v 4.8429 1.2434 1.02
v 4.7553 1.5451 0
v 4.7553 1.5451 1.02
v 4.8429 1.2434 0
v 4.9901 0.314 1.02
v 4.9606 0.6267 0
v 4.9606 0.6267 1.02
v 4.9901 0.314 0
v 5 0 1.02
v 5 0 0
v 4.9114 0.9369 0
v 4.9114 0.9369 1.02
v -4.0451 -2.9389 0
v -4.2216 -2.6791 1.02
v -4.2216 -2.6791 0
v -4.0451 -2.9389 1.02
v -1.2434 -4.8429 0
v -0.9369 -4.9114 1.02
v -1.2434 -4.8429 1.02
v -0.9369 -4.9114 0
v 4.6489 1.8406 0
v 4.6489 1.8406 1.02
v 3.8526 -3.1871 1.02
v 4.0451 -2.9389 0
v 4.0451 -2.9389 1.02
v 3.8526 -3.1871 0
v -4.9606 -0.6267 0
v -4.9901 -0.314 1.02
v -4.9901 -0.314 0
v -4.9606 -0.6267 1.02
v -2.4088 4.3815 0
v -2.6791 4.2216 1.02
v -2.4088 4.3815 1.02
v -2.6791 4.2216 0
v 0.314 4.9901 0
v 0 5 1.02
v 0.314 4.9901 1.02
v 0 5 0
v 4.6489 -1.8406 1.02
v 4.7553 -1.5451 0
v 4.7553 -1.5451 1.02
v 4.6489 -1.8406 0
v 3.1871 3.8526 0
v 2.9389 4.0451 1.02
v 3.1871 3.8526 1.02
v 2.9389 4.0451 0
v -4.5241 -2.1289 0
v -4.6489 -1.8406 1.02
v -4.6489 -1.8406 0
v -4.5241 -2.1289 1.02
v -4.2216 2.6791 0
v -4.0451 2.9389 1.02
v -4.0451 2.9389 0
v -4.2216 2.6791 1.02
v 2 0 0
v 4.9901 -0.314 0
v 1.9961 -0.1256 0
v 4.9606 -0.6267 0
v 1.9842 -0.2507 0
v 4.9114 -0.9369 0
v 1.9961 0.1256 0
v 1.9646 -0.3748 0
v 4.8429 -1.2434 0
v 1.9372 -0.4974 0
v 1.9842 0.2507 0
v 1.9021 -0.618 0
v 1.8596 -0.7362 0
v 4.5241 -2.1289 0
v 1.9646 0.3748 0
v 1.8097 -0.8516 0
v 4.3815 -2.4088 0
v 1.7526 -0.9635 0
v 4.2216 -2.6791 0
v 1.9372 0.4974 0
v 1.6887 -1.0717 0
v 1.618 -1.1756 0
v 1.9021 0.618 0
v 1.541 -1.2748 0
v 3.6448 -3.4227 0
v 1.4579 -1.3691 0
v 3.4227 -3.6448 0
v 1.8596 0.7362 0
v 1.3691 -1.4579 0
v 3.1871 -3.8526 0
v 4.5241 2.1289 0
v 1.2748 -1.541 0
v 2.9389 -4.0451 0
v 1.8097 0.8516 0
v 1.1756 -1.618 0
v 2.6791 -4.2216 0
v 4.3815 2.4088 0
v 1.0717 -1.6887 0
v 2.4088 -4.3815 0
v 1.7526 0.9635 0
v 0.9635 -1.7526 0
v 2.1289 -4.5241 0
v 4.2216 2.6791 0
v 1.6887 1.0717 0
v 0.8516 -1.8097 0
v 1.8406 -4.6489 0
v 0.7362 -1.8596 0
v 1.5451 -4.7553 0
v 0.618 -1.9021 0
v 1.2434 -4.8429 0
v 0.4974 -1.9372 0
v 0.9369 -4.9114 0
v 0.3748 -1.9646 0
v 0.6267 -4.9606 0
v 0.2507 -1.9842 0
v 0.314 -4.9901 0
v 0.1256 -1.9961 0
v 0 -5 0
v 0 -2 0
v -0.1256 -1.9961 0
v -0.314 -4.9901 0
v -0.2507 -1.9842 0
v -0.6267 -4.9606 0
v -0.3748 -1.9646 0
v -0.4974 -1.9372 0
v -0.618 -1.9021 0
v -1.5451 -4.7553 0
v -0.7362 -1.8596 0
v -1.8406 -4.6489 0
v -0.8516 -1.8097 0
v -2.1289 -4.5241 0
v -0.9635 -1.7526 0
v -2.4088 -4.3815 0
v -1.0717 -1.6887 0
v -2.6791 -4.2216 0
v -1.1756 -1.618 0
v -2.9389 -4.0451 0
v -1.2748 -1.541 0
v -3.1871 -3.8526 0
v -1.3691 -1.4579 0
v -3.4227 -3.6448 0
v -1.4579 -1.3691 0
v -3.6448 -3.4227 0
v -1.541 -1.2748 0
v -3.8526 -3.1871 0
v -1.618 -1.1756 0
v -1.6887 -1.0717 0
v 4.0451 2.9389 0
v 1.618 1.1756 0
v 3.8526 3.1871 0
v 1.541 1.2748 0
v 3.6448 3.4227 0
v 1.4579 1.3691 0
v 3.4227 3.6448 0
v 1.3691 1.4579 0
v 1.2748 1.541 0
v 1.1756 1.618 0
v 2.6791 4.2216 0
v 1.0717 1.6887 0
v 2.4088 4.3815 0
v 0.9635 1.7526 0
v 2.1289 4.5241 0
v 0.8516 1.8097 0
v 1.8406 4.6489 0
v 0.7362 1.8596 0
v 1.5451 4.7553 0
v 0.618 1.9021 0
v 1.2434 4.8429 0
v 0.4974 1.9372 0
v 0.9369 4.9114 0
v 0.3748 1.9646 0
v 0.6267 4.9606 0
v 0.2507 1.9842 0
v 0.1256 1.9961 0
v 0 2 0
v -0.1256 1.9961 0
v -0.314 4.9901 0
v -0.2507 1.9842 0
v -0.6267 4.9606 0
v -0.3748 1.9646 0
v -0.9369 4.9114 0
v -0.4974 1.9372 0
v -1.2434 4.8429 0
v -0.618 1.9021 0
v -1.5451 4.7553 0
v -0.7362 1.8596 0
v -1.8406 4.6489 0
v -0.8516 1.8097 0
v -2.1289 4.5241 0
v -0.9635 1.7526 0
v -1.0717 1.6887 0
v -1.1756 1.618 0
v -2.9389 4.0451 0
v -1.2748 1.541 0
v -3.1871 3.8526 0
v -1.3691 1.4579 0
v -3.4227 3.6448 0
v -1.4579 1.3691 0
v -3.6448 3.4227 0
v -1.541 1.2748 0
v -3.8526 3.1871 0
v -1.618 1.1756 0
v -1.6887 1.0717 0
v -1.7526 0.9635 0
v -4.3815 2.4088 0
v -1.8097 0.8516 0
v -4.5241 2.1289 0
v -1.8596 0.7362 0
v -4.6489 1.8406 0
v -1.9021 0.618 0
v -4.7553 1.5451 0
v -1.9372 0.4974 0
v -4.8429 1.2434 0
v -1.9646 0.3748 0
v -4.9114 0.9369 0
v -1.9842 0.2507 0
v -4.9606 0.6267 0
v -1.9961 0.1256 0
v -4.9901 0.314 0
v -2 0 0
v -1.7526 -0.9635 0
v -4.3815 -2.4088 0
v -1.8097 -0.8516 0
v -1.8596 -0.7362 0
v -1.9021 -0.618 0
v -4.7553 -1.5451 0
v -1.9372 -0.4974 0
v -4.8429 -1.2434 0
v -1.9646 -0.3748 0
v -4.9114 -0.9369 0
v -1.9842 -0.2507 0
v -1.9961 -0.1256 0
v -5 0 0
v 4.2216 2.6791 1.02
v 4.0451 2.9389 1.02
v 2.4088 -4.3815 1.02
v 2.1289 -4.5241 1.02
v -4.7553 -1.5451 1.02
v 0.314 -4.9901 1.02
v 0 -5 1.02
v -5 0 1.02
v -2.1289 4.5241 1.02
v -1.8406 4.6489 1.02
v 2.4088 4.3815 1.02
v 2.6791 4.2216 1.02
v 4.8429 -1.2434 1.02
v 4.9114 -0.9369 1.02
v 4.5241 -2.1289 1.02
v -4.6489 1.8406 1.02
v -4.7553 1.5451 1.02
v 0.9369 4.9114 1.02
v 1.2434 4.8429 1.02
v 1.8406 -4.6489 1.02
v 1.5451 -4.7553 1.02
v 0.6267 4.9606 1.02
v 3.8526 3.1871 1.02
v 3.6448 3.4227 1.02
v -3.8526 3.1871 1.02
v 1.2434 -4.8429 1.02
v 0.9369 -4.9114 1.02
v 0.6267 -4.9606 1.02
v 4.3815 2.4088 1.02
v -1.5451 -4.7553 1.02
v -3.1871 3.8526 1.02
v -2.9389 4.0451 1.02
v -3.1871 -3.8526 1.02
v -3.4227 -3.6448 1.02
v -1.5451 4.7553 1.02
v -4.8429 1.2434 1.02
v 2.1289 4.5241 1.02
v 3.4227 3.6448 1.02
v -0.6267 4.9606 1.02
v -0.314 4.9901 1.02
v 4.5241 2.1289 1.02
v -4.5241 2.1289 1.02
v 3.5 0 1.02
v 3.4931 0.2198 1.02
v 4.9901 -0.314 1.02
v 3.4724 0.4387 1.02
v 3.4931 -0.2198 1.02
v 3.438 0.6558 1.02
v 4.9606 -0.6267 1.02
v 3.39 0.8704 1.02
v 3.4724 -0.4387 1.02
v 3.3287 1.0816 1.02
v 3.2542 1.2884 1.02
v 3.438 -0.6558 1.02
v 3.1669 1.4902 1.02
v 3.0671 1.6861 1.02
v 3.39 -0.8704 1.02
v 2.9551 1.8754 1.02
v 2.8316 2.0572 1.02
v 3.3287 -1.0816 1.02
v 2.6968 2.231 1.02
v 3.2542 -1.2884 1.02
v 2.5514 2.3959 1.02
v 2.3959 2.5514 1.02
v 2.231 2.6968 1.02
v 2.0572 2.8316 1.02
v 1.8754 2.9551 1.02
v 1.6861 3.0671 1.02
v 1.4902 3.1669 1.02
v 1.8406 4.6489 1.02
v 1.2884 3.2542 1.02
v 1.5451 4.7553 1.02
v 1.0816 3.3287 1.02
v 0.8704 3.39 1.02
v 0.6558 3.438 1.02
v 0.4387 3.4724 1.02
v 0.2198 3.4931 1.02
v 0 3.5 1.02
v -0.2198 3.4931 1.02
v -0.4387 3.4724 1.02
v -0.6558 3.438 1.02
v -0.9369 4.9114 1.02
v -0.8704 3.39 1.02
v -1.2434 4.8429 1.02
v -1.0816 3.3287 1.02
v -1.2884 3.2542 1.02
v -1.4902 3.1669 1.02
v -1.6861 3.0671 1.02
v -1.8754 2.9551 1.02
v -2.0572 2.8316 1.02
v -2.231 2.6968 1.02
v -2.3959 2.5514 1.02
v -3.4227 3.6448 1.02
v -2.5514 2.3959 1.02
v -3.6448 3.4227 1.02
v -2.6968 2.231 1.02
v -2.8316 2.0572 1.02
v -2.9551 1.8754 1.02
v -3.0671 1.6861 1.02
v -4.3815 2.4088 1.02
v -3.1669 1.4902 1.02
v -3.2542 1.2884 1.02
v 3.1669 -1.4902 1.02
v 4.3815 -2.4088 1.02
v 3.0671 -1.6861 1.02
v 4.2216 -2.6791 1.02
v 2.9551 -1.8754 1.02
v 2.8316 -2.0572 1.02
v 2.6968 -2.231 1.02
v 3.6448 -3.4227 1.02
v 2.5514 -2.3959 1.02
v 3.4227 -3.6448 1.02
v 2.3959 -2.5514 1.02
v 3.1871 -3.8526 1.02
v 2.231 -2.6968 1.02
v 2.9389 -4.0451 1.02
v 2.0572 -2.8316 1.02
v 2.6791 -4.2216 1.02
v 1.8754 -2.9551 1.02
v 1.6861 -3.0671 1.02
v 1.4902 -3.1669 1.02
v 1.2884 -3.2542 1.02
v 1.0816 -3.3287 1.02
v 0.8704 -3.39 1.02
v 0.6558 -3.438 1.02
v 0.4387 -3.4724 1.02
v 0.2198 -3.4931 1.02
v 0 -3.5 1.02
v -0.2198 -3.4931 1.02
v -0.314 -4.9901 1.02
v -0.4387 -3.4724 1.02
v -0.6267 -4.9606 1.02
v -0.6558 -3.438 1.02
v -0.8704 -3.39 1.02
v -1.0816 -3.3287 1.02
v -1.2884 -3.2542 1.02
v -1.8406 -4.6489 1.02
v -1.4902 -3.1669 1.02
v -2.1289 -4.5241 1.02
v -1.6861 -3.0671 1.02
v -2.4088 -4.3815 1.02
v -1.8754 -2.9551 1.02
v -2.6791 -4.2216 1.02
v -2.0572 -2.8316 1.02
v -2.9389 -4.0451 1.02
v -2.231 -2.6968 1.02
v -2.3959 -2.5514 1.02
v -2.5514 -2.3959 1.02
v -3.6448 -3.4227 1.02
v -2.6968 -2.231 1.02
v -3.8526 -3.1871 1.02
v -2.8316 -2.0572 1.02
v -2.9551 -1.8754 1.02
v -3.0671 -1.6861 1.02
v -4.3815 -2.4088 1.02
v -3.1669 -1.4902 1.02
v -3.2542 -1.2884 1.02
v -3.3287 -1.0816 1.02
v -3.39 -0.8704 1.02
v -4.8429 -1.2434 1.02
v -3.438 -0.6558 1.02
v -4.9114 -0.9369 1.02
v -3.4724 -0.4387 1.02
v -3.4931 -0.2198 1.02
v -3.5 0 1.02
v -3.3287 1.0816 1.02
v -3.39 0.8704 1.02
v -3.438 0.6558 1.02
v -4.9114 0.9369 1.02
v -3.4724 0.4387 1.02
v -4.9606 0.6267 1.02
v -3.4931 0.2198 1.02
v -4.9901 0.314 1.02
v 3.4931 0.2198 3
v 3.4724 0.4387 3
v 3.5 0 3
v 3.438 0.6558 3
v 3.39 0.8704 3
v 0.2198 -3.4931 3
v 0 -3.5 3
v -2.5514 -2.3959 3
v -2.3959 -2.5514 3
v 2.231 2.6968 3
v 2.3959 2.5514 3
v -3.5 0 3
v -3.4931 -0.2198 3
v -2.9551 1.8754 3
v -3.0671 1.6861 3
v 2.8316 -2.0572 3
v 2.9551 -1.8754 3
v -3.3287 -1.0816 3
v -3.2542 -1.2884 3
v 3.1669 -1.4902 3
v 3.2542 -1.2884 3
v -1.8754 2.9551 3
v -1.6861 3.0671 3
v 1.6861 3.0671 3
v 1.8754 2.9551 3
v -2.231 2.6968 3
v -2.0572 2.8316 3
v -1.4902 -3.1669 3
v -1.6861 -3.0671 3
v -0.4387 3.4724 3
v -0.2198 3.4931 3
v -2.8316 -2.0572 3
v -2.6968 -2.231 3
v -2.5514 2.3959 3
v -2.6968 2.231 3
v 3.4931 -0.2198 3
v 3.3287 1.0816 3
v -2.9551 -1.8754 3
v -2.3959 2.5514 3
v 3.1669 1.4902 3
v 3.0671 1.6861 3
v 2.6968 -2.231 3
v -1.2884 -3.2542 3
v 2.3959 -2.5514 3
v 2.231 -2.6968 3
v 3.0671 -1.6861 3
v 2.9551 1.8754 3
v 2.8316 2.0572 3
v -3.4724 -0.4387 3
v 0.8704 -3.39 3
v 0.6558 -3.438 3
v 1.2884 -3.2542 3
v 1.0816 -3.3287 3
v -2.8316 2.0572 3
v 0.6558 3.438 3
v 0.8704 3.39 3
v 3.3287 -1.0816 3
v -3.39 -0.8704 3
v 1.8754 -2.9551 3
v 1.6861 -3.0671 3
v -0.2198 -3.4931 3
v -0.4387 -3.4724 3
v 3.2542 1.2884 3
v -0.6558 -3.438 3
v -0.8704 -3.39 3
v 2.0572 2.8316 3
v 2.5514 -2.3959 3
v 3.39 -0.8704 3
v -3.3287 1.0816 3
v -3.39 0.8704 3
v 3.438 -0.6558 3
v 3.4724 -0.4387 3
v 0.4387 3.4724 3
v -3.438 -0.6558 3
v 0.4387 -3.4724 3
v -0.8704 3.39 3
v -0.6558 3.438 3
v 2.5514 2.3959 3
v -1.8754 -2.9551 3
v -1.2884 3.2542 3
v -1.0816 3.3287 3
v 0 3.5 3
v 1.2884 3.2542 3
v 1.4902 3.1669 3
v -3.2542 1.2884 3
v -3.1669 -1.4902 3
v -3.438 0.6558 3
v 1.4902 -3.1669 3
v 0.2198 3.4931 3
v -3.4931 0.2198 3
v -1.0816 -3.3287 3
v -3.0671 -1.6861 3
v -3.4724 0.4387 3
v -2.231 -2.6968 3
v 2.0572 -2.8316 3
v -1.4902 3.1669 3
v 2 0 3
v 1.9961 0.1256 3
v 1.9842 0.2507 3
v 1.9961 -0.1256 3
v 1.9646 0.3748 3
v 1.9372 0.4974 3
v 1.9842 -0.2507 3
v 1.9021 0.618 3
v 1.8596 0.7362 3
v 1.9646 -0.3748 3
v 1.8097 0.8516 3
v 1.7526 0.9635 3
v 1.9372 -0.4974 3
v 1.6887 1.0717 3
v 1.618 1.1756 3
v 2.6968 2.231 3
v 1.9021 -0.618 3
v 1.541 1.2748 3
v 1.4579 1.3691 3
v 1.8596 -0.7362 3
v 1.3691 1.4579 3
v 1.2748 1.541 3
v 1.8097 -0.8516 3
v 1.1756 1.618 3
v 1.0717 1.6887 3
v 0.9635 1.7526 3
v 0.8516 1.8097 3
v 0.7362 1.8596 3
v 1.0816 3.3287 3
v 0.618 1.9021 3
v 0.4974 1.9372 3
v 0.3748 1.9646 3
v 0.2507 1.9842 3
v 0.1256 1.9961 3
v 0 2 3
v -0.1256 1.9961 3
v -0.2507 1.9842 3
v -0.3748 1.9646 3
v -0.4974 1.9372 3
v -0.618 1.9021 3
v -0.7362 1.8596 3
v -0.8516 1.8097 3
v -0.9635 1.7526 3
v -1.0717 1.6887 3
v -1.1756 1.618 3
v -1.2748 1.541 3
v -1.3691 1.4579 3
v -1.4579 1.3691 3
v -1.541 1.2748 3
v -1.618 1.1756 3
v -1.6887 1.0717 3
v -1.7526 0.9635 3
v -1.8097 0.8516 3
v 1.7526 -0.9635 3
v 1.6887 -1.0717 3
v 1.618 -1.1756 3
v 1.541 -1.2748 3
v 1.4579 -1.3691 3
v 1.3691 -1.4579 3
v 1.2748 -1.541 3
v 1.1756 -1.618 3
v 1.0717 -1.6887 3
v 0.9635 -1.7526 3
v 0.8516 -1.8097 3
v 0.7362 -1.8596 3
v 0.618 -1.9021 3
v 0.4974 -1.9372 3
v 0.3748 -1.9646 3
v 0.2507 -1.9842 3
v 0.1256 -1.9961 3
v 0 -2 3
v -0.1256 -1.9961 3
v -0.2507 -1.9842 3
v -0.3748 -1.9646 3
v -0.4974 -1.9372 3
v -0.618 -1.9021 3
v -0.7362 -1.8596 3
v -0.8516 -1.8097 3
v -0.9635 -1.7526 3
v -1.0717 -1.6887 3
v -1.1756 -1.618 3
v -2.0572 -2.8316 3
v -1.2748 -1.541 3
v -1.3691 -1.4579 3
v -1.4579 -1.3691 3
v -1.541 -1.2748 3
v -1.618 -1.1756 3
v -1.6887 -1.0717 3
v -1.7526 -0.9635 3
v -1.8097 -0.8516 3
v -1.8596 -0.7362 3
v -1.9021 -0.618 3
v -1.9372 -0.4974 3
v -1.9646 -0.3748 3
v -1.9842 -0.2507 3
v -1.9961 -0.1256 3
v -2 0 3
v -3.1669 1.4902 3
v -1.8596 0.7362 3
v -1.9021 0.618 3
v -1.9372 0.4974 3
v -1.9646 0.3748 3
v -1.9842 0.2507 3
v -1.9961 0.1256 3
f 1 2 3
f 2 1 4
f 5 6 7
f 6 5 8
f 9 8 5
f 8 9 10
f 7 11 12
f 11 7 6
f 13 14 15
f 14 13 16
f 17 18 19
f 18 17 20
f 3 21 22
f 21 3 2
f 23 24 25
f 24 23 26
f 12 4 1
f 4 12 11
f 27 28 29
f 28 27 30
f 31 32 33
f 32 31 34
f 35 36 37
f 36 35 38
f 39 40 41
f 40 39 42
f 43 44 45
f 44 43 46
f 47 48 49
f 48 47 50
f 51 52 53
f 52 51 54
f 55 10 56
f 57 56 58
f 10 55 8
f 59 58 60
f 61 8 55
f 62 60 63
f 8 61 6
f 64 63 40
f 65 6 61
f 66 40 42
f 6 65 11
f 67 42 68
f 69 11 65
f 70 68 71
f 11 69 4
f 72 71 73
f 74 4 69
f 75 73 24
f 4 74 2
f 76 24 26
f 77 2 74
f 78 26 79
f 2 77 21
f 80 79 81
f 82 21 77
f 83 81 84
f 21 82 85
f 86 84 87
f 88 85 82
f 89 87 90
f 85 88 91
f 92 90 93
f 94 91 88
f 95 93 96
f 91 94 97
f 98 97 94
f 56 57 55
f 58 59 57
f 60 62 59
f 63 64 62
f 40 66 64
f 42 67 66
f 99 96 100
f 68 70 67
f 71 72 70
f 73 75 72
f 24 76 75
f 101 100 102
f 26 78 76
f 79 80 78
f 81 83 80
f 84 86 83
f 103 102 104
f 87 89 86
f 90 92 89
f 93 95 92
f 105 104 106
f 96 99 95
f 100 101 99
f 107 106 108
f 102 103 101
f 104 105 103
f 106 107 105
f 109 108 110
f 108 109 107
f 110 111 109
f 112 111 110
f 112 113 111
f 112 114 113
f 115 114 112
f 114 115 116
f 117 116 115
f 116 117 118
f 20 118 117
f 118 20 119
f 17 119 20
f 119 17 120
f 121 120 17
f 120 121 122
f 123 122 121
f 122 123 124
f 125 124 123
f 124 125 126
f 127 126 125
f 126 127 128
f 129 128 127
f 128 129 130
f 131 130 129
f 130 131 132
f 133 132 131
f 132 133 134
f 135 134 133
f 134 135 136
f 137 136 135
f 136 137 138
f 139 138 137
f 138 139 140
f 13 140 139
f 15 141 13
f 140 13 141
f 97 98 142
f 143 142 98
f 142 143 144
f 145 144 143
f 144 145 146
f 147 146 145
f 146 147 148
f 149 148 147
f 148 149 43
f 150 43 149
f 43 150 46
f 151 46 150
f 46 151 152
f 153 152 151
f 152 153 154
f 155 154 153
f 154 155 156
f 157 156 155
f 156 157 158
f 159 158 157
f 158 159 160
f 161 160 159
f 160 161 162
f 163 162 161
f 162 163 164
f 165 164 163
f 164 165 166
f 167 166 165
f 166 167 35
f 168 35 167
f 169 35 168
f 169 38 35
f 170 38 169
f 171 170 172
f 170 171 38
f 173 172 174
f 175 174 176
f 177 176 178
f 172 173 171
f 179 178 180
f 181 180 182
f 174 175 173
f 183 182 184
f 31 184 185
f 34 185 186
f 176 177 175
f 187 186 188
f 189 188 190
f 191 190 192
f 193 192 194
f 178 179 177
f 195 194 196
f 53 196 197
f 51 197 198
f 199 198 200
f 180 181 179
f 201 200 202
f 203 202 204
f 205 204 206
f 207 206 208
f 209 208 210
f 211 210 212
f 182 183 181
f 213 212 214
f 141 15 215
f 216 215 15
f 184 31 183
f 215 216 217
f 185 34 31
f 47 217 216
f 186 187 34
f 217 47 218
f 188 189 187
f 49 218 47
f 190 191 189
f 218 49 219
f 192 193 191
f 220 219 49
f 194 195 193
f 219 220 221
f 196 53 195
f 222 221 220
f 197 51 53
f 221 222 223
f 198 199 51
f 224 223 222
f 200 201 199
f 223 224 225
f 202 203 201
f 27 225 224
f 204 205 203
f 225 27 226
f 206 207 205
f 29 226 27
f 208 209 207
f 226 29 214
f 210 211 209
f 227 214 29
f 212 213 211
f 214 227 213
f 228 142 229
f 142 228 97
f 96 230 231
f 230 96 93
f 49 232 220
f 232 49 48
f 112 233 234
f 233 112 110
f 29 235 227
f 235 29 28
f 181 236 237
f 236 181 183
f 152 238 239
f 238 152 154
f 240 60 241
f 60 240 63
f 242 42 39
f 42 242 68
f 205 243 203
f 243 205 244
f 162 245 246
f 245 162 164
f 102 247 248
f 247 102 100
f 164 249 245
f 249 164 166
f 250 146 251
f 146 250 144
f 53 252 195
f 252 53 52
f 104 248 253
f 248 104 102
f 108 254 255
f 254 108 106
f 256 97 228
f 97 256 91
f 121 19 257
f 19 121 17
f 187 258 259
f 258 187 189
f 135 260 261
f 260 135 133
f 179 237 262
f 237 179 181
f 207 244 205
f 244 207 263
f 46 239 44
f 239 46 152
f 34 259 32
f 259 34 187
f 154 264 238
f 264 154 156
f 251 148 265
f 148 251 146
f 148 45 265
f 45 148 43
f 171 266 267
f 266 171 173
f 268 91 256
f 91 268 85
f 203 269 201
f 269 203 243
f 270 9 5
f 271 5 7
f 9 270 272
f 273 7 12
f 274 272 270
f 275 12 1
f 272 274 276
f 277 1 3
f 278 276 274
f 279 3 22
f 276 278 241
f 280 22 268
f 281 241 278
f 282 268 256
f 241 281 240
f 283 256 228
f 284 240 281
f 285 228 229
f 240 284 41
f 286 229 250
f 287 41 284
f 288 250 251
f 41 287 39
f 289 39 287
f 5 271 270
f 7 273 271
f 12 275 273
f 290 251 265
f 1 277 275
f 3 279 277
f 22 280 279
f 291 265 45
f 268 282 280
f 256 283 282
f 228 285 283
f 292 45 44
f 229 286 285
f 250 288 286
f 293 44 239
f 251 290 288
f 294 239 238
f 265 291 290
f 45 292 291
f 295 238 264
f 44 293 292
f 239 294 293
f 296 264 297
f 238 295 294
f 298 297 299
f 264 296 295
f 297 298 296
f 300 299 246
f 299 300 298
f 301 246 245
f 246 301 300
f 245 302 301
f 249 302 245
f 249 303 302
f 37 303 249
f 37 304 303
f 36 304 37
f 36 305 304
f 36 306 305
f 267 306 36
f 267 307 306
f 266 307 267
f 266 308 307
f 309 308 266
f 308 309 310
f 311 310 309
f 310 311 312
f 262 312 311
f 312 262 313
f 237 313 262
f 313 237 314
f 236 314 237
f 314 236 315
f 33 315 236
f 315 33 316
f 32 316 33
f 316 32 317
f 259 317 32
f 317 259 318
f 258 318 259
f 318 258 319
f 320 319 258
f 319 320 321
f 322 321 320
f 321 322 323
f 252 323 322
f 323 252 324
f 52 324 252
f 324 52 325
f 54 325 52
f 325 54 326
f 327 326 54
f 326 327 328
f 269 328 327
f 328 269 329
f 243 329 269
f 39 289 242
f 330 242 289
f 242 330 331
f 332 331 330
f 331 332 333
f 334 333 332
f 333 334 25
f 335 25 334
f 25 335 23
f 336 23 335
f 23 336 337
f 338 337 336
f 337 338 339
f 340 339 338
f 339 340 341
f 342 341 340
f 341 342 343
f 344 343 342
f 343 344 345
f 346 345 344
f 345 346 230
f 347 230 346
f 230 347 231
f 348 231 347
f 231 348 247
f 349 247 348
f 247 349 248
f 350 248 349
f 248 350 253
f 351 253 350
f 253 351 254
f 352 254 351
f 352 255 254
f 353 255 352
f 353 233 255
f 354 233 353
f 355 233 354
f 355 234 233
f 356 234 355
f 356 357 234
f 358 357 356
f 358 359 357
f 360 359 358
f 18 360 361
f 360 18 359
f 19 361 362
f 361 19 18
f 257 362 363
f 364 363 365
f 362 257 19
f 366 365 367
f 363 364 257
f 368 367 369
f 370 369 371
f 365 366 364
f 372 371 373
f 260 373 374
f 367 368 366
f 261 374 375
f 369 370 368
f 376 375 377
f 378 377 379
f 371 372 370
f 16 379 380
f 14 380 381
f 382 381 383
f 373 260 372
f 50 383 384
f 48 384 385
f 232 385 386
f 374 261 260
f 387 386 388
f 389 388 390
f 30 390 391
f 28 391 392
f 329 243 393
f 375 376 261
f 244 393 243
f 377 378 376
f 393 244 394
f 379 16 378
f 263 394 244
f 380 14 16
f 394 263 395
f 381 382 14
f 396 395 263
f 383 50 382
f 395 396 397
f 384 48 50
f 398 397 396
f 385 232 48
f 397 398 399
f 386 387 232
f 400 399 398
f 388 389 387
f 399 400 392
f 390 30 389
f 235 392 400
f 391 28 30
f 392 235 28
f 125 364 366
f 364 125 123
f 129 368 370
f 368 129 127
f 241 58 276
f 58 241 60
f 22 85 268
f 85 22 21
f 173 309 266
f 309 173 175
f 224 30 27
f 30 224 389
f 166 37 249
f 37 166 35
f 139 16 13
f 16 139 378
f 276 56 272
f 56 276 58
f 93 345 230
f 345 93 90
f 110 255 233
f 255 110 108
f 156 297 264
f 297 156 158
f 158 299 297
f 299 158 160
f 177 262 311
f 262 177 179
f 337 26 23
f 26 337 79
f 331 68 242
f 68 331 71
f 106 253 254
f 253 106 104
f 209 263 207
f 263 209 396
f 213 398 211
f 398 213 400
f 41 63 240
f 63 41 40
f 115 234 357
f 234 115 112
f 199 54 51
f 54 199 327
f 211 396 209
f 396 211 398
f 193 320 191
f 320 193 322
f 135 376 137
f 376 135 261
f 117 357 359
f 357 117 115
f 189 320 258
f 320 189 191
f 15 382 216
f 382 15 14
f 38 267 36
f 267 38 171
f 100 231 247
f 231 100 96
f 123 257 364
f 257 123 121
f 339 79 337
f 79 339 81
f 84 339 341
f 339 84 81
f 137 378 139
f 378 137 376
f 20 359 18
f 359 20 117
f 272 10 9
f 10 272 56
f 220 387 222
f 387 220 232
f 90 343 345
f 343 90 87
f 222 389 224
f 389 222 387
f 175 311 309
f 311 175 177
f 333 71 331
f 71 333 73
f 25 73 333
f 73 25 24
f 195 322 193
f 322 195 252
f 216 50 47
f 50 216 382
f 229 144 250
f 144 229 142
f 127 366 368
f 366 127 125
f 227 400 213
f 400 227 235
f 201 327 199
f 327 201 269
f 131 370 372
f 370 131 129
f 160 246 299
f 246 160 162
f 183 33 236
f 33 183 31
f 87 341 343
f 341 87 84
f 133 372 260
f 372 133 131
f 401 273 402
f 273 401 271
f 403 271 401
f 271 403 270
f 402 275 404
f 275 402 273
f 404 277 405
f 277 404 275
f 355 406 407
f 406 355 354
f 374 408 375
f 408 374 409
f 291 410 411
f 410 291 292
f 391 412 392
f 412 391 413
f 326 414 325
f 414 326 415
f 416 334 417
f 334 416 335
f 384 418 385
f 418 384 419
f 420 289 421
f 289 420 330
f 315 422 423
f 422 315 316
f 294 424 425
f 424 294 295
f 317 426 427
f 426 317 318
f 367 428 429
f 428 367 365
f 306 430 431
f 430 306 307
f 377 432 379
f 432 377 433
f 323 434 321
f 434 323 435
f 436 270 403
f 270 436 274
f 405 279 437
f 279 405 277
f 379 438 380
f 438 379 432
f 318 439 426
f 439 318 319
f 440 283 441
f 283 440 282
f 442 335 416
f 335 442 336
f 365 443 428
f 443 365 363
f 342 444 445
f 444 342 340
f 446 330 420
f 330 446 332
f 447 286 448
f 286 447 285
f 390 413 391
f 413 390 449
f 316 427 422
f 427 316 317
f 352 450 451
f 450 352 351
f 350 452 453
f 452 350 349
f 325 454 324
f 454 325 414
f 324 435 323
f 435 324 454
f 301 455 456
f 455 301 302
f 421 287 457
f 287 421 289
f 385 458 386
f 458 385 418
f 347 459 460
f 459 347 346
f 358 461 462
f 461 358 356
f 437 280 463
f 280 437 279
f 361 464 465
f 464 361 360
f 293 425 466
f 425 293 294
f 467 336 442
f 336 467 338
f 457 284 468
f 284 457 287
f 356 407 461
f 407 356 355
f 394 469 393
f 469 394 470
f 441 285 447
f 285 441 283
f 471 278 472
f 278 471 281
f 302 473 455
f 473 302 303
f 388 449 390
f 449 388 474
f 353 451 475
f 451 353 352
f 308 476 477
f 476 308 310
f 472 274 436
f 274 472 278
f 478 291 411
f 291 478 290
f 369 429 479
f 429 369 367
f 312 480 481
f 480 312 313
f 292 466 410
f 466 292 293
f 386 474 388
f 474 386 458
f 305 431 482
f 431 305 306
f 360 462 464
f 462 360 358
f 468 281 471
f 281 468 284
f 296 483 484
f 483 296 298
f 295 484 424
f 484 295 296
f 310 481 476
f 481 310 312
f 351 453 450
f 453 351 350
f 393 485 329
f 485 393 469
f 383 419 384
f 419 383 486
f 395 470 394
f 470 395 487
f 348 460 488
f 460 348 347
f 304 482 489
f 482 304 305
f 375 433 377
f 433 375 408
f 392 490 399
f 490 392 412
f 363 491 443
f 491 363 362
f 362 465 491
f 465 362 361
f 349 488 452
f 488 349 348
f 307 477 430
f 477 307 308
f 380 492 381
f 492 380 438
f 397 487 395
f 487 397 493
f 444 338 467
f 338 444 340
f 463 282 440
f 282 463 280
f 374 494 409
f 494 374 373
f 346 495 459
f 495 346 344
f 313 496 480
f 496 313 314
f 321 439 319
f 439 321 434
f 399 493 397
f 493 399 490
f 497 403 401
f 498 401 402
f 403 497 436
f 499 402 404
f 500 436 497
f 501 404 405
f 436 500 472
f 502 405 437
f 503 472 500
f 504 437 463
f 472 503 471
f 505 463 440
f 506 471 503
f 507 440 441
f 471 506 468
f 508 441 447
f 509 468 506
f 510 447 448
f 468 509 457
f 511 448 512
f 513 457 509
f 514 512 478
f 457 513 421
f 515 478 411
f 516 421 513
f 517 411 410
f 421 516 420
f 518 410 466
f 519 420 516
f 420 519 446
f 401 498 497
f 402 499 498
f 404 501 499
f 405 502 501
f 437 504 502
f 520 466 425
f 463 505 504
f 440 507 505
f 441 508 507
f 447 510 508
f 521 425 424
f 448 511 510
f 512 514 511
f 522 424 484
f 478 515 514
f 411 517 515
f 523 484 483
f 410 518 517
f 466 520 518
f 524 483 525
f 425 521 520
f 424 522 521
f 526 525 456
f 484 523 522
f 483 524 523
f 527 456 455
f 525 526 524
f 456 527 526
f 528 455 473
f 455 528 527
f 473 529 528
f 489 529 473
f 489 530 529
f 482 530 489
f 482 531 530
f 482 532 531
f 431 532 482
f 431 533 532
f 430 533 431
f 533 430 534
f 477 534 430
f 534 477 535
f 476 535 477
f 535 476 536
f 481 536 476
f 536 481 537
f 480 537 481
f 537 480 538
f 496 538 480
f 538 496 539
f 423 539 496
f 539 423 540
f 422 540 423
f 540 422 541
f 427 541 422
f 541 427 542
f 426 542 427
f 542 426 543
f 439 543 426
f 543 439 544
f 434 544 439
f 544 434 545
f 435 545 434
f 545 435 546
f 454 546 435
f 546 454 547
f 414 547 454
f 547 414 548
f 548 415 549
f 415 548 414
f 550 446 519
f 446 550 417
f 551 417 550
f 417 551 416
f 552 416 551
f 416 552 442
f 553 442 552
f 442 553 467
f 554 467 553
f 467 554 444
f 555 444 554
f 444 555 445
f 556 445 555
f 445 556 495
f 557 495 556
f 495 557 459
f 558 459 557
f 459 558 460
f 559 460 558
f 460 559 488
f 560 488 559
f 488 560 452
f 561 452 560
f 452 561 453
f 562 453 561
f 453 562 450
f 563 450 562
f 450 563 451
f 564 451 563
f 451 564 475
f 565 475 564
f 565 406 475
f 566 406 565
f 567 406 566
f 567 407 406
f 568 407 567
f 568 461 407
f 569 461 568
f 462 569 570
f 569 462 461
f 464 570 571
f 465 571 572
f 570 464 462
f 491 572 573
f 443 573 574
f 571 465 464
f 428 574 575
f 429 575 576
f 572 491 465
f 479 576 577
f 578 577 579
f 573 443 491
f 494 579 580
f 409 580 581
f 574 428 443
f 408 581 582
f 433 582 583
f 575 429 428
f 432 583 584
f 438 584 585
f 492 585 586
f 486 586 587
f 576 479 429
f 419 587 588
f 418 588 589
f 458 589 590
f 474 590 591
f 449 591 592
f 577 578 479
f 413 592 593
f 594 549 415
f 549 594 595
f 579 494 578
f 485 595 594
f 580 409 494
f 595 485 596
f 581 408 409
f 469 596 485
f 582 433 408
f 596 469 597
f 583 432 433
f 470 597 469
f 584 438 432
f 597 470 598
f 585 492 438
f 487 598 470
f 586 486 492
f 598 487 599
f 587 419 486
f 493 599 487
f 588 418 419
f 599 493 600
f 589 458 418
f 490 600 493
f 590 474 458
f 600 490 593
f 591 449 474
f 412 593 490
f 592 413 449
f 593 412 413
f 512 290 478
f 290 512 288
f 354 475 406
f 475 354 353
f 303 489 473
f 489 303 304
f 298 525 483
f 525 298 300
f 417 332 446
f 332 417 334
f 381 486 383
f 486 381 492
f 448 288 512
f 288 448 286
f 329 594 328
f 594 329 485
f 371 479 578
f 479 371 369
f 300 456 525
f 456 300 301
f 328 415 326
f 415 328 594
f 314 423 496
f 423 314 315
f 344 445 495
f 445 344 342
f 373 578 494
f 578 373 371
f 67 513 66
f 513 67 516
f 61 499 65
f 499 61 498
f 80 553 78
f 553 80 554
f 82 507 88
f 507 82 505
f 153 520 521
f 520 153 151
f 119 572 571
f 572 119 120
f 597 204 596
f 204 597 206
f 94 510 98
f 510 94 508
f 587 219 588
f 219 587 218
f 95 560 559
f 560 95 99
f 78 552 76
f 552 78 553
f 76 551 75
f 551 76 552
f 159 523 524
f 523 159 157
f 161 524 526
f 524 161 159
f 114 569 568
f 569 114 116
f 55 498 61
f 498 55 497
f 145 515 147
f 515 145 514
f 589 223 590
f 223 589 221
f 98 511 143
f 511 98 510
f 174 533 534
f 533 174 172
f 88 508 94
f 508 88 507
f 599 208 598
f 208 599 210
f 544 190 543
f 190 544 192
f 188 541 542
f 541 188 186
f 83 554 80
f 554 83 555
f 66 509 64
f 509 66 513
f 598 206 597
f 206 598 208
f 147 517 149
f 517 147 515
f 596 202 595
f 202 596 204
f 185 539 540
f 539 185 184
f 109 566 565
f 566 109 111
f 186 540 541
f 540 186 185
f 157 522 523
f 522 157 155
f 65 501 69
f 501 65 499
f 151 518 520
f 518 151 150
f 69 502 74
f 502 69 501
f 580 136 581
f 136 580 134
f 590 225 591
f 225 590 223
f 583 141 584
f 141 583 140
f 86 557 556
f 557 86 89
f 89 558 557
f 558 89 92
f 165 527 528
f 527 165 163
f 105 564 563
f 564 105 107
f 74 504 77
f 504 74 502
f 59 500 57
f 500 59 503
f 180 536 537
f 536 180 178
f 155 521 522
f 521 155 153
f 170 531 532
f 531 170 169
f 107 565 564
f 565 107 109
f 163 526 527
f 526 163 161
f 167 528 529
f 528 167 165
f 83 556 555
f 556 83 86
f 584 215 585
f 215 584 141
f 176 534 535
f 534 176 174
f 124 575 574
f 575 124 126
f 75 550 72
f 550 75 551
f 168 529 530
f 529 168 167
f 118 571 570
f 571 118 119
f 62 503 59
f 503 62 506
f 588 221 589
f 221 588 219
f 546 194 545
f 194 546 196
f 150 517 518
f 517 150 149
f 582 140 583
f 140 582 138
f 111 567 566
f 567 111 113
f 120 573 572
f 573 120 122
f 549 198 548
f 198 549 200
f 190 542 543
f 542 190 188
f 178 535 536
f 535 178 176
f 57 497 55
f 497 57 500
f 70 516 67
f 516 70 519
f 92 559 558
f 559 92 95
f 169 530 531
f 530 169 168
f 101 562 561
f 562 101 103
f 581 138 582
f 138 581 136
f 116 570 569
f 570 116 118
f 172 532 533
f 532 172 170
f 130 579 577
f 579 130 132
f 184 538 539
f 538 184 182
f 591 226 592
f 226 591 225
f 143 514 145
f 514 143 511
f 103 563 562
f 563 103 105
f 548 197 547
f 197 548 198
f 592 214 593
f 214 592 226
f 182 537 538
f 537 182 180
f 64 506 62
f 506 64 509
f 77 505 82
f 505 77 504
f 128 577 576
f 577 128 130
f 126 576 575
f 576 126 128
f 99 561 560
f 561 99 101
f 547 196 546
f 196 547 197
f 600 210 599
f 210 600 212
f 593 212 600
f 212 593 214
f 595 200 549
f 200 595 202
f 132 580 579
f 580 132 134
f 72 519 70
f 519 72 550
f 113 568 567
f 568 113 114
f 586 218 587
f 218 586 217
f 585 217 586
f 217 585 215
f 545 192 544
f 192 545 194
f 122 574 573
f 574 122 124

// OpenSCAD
// variables
height = 3; // [1:100]
pipe_height_in_percent = 66; // [0:100]
washer_diameter = 10; // [1:99]
pipe_diamater = 7; // [1:100]
hole = 1; // [1:Yes,0:No]
hole_diameter = 4; // [1:100]
resolution = 100; // [100:rough,150:middle,200:fine]


// model
difference(){
	union(){
		cylinder(h=height/100*(100-pipe_height_in_percent),r1=washer_diameter/2,r2=washer_diameter/2,$fn=resolution);
		translate([0,0,height/100*(100-pipe_height_in_percent)]) cylinder(h=height/100*pipe_height_in_percent,r1=pipe_diamater/2,r2=pipe_diamater/2,$fn=resolution);
	}
	if(hole==1){
		cylinder(h=height,r1=hole_diameter/2,r2=hole_diameter/2,$fn=resolution);
	}
}
